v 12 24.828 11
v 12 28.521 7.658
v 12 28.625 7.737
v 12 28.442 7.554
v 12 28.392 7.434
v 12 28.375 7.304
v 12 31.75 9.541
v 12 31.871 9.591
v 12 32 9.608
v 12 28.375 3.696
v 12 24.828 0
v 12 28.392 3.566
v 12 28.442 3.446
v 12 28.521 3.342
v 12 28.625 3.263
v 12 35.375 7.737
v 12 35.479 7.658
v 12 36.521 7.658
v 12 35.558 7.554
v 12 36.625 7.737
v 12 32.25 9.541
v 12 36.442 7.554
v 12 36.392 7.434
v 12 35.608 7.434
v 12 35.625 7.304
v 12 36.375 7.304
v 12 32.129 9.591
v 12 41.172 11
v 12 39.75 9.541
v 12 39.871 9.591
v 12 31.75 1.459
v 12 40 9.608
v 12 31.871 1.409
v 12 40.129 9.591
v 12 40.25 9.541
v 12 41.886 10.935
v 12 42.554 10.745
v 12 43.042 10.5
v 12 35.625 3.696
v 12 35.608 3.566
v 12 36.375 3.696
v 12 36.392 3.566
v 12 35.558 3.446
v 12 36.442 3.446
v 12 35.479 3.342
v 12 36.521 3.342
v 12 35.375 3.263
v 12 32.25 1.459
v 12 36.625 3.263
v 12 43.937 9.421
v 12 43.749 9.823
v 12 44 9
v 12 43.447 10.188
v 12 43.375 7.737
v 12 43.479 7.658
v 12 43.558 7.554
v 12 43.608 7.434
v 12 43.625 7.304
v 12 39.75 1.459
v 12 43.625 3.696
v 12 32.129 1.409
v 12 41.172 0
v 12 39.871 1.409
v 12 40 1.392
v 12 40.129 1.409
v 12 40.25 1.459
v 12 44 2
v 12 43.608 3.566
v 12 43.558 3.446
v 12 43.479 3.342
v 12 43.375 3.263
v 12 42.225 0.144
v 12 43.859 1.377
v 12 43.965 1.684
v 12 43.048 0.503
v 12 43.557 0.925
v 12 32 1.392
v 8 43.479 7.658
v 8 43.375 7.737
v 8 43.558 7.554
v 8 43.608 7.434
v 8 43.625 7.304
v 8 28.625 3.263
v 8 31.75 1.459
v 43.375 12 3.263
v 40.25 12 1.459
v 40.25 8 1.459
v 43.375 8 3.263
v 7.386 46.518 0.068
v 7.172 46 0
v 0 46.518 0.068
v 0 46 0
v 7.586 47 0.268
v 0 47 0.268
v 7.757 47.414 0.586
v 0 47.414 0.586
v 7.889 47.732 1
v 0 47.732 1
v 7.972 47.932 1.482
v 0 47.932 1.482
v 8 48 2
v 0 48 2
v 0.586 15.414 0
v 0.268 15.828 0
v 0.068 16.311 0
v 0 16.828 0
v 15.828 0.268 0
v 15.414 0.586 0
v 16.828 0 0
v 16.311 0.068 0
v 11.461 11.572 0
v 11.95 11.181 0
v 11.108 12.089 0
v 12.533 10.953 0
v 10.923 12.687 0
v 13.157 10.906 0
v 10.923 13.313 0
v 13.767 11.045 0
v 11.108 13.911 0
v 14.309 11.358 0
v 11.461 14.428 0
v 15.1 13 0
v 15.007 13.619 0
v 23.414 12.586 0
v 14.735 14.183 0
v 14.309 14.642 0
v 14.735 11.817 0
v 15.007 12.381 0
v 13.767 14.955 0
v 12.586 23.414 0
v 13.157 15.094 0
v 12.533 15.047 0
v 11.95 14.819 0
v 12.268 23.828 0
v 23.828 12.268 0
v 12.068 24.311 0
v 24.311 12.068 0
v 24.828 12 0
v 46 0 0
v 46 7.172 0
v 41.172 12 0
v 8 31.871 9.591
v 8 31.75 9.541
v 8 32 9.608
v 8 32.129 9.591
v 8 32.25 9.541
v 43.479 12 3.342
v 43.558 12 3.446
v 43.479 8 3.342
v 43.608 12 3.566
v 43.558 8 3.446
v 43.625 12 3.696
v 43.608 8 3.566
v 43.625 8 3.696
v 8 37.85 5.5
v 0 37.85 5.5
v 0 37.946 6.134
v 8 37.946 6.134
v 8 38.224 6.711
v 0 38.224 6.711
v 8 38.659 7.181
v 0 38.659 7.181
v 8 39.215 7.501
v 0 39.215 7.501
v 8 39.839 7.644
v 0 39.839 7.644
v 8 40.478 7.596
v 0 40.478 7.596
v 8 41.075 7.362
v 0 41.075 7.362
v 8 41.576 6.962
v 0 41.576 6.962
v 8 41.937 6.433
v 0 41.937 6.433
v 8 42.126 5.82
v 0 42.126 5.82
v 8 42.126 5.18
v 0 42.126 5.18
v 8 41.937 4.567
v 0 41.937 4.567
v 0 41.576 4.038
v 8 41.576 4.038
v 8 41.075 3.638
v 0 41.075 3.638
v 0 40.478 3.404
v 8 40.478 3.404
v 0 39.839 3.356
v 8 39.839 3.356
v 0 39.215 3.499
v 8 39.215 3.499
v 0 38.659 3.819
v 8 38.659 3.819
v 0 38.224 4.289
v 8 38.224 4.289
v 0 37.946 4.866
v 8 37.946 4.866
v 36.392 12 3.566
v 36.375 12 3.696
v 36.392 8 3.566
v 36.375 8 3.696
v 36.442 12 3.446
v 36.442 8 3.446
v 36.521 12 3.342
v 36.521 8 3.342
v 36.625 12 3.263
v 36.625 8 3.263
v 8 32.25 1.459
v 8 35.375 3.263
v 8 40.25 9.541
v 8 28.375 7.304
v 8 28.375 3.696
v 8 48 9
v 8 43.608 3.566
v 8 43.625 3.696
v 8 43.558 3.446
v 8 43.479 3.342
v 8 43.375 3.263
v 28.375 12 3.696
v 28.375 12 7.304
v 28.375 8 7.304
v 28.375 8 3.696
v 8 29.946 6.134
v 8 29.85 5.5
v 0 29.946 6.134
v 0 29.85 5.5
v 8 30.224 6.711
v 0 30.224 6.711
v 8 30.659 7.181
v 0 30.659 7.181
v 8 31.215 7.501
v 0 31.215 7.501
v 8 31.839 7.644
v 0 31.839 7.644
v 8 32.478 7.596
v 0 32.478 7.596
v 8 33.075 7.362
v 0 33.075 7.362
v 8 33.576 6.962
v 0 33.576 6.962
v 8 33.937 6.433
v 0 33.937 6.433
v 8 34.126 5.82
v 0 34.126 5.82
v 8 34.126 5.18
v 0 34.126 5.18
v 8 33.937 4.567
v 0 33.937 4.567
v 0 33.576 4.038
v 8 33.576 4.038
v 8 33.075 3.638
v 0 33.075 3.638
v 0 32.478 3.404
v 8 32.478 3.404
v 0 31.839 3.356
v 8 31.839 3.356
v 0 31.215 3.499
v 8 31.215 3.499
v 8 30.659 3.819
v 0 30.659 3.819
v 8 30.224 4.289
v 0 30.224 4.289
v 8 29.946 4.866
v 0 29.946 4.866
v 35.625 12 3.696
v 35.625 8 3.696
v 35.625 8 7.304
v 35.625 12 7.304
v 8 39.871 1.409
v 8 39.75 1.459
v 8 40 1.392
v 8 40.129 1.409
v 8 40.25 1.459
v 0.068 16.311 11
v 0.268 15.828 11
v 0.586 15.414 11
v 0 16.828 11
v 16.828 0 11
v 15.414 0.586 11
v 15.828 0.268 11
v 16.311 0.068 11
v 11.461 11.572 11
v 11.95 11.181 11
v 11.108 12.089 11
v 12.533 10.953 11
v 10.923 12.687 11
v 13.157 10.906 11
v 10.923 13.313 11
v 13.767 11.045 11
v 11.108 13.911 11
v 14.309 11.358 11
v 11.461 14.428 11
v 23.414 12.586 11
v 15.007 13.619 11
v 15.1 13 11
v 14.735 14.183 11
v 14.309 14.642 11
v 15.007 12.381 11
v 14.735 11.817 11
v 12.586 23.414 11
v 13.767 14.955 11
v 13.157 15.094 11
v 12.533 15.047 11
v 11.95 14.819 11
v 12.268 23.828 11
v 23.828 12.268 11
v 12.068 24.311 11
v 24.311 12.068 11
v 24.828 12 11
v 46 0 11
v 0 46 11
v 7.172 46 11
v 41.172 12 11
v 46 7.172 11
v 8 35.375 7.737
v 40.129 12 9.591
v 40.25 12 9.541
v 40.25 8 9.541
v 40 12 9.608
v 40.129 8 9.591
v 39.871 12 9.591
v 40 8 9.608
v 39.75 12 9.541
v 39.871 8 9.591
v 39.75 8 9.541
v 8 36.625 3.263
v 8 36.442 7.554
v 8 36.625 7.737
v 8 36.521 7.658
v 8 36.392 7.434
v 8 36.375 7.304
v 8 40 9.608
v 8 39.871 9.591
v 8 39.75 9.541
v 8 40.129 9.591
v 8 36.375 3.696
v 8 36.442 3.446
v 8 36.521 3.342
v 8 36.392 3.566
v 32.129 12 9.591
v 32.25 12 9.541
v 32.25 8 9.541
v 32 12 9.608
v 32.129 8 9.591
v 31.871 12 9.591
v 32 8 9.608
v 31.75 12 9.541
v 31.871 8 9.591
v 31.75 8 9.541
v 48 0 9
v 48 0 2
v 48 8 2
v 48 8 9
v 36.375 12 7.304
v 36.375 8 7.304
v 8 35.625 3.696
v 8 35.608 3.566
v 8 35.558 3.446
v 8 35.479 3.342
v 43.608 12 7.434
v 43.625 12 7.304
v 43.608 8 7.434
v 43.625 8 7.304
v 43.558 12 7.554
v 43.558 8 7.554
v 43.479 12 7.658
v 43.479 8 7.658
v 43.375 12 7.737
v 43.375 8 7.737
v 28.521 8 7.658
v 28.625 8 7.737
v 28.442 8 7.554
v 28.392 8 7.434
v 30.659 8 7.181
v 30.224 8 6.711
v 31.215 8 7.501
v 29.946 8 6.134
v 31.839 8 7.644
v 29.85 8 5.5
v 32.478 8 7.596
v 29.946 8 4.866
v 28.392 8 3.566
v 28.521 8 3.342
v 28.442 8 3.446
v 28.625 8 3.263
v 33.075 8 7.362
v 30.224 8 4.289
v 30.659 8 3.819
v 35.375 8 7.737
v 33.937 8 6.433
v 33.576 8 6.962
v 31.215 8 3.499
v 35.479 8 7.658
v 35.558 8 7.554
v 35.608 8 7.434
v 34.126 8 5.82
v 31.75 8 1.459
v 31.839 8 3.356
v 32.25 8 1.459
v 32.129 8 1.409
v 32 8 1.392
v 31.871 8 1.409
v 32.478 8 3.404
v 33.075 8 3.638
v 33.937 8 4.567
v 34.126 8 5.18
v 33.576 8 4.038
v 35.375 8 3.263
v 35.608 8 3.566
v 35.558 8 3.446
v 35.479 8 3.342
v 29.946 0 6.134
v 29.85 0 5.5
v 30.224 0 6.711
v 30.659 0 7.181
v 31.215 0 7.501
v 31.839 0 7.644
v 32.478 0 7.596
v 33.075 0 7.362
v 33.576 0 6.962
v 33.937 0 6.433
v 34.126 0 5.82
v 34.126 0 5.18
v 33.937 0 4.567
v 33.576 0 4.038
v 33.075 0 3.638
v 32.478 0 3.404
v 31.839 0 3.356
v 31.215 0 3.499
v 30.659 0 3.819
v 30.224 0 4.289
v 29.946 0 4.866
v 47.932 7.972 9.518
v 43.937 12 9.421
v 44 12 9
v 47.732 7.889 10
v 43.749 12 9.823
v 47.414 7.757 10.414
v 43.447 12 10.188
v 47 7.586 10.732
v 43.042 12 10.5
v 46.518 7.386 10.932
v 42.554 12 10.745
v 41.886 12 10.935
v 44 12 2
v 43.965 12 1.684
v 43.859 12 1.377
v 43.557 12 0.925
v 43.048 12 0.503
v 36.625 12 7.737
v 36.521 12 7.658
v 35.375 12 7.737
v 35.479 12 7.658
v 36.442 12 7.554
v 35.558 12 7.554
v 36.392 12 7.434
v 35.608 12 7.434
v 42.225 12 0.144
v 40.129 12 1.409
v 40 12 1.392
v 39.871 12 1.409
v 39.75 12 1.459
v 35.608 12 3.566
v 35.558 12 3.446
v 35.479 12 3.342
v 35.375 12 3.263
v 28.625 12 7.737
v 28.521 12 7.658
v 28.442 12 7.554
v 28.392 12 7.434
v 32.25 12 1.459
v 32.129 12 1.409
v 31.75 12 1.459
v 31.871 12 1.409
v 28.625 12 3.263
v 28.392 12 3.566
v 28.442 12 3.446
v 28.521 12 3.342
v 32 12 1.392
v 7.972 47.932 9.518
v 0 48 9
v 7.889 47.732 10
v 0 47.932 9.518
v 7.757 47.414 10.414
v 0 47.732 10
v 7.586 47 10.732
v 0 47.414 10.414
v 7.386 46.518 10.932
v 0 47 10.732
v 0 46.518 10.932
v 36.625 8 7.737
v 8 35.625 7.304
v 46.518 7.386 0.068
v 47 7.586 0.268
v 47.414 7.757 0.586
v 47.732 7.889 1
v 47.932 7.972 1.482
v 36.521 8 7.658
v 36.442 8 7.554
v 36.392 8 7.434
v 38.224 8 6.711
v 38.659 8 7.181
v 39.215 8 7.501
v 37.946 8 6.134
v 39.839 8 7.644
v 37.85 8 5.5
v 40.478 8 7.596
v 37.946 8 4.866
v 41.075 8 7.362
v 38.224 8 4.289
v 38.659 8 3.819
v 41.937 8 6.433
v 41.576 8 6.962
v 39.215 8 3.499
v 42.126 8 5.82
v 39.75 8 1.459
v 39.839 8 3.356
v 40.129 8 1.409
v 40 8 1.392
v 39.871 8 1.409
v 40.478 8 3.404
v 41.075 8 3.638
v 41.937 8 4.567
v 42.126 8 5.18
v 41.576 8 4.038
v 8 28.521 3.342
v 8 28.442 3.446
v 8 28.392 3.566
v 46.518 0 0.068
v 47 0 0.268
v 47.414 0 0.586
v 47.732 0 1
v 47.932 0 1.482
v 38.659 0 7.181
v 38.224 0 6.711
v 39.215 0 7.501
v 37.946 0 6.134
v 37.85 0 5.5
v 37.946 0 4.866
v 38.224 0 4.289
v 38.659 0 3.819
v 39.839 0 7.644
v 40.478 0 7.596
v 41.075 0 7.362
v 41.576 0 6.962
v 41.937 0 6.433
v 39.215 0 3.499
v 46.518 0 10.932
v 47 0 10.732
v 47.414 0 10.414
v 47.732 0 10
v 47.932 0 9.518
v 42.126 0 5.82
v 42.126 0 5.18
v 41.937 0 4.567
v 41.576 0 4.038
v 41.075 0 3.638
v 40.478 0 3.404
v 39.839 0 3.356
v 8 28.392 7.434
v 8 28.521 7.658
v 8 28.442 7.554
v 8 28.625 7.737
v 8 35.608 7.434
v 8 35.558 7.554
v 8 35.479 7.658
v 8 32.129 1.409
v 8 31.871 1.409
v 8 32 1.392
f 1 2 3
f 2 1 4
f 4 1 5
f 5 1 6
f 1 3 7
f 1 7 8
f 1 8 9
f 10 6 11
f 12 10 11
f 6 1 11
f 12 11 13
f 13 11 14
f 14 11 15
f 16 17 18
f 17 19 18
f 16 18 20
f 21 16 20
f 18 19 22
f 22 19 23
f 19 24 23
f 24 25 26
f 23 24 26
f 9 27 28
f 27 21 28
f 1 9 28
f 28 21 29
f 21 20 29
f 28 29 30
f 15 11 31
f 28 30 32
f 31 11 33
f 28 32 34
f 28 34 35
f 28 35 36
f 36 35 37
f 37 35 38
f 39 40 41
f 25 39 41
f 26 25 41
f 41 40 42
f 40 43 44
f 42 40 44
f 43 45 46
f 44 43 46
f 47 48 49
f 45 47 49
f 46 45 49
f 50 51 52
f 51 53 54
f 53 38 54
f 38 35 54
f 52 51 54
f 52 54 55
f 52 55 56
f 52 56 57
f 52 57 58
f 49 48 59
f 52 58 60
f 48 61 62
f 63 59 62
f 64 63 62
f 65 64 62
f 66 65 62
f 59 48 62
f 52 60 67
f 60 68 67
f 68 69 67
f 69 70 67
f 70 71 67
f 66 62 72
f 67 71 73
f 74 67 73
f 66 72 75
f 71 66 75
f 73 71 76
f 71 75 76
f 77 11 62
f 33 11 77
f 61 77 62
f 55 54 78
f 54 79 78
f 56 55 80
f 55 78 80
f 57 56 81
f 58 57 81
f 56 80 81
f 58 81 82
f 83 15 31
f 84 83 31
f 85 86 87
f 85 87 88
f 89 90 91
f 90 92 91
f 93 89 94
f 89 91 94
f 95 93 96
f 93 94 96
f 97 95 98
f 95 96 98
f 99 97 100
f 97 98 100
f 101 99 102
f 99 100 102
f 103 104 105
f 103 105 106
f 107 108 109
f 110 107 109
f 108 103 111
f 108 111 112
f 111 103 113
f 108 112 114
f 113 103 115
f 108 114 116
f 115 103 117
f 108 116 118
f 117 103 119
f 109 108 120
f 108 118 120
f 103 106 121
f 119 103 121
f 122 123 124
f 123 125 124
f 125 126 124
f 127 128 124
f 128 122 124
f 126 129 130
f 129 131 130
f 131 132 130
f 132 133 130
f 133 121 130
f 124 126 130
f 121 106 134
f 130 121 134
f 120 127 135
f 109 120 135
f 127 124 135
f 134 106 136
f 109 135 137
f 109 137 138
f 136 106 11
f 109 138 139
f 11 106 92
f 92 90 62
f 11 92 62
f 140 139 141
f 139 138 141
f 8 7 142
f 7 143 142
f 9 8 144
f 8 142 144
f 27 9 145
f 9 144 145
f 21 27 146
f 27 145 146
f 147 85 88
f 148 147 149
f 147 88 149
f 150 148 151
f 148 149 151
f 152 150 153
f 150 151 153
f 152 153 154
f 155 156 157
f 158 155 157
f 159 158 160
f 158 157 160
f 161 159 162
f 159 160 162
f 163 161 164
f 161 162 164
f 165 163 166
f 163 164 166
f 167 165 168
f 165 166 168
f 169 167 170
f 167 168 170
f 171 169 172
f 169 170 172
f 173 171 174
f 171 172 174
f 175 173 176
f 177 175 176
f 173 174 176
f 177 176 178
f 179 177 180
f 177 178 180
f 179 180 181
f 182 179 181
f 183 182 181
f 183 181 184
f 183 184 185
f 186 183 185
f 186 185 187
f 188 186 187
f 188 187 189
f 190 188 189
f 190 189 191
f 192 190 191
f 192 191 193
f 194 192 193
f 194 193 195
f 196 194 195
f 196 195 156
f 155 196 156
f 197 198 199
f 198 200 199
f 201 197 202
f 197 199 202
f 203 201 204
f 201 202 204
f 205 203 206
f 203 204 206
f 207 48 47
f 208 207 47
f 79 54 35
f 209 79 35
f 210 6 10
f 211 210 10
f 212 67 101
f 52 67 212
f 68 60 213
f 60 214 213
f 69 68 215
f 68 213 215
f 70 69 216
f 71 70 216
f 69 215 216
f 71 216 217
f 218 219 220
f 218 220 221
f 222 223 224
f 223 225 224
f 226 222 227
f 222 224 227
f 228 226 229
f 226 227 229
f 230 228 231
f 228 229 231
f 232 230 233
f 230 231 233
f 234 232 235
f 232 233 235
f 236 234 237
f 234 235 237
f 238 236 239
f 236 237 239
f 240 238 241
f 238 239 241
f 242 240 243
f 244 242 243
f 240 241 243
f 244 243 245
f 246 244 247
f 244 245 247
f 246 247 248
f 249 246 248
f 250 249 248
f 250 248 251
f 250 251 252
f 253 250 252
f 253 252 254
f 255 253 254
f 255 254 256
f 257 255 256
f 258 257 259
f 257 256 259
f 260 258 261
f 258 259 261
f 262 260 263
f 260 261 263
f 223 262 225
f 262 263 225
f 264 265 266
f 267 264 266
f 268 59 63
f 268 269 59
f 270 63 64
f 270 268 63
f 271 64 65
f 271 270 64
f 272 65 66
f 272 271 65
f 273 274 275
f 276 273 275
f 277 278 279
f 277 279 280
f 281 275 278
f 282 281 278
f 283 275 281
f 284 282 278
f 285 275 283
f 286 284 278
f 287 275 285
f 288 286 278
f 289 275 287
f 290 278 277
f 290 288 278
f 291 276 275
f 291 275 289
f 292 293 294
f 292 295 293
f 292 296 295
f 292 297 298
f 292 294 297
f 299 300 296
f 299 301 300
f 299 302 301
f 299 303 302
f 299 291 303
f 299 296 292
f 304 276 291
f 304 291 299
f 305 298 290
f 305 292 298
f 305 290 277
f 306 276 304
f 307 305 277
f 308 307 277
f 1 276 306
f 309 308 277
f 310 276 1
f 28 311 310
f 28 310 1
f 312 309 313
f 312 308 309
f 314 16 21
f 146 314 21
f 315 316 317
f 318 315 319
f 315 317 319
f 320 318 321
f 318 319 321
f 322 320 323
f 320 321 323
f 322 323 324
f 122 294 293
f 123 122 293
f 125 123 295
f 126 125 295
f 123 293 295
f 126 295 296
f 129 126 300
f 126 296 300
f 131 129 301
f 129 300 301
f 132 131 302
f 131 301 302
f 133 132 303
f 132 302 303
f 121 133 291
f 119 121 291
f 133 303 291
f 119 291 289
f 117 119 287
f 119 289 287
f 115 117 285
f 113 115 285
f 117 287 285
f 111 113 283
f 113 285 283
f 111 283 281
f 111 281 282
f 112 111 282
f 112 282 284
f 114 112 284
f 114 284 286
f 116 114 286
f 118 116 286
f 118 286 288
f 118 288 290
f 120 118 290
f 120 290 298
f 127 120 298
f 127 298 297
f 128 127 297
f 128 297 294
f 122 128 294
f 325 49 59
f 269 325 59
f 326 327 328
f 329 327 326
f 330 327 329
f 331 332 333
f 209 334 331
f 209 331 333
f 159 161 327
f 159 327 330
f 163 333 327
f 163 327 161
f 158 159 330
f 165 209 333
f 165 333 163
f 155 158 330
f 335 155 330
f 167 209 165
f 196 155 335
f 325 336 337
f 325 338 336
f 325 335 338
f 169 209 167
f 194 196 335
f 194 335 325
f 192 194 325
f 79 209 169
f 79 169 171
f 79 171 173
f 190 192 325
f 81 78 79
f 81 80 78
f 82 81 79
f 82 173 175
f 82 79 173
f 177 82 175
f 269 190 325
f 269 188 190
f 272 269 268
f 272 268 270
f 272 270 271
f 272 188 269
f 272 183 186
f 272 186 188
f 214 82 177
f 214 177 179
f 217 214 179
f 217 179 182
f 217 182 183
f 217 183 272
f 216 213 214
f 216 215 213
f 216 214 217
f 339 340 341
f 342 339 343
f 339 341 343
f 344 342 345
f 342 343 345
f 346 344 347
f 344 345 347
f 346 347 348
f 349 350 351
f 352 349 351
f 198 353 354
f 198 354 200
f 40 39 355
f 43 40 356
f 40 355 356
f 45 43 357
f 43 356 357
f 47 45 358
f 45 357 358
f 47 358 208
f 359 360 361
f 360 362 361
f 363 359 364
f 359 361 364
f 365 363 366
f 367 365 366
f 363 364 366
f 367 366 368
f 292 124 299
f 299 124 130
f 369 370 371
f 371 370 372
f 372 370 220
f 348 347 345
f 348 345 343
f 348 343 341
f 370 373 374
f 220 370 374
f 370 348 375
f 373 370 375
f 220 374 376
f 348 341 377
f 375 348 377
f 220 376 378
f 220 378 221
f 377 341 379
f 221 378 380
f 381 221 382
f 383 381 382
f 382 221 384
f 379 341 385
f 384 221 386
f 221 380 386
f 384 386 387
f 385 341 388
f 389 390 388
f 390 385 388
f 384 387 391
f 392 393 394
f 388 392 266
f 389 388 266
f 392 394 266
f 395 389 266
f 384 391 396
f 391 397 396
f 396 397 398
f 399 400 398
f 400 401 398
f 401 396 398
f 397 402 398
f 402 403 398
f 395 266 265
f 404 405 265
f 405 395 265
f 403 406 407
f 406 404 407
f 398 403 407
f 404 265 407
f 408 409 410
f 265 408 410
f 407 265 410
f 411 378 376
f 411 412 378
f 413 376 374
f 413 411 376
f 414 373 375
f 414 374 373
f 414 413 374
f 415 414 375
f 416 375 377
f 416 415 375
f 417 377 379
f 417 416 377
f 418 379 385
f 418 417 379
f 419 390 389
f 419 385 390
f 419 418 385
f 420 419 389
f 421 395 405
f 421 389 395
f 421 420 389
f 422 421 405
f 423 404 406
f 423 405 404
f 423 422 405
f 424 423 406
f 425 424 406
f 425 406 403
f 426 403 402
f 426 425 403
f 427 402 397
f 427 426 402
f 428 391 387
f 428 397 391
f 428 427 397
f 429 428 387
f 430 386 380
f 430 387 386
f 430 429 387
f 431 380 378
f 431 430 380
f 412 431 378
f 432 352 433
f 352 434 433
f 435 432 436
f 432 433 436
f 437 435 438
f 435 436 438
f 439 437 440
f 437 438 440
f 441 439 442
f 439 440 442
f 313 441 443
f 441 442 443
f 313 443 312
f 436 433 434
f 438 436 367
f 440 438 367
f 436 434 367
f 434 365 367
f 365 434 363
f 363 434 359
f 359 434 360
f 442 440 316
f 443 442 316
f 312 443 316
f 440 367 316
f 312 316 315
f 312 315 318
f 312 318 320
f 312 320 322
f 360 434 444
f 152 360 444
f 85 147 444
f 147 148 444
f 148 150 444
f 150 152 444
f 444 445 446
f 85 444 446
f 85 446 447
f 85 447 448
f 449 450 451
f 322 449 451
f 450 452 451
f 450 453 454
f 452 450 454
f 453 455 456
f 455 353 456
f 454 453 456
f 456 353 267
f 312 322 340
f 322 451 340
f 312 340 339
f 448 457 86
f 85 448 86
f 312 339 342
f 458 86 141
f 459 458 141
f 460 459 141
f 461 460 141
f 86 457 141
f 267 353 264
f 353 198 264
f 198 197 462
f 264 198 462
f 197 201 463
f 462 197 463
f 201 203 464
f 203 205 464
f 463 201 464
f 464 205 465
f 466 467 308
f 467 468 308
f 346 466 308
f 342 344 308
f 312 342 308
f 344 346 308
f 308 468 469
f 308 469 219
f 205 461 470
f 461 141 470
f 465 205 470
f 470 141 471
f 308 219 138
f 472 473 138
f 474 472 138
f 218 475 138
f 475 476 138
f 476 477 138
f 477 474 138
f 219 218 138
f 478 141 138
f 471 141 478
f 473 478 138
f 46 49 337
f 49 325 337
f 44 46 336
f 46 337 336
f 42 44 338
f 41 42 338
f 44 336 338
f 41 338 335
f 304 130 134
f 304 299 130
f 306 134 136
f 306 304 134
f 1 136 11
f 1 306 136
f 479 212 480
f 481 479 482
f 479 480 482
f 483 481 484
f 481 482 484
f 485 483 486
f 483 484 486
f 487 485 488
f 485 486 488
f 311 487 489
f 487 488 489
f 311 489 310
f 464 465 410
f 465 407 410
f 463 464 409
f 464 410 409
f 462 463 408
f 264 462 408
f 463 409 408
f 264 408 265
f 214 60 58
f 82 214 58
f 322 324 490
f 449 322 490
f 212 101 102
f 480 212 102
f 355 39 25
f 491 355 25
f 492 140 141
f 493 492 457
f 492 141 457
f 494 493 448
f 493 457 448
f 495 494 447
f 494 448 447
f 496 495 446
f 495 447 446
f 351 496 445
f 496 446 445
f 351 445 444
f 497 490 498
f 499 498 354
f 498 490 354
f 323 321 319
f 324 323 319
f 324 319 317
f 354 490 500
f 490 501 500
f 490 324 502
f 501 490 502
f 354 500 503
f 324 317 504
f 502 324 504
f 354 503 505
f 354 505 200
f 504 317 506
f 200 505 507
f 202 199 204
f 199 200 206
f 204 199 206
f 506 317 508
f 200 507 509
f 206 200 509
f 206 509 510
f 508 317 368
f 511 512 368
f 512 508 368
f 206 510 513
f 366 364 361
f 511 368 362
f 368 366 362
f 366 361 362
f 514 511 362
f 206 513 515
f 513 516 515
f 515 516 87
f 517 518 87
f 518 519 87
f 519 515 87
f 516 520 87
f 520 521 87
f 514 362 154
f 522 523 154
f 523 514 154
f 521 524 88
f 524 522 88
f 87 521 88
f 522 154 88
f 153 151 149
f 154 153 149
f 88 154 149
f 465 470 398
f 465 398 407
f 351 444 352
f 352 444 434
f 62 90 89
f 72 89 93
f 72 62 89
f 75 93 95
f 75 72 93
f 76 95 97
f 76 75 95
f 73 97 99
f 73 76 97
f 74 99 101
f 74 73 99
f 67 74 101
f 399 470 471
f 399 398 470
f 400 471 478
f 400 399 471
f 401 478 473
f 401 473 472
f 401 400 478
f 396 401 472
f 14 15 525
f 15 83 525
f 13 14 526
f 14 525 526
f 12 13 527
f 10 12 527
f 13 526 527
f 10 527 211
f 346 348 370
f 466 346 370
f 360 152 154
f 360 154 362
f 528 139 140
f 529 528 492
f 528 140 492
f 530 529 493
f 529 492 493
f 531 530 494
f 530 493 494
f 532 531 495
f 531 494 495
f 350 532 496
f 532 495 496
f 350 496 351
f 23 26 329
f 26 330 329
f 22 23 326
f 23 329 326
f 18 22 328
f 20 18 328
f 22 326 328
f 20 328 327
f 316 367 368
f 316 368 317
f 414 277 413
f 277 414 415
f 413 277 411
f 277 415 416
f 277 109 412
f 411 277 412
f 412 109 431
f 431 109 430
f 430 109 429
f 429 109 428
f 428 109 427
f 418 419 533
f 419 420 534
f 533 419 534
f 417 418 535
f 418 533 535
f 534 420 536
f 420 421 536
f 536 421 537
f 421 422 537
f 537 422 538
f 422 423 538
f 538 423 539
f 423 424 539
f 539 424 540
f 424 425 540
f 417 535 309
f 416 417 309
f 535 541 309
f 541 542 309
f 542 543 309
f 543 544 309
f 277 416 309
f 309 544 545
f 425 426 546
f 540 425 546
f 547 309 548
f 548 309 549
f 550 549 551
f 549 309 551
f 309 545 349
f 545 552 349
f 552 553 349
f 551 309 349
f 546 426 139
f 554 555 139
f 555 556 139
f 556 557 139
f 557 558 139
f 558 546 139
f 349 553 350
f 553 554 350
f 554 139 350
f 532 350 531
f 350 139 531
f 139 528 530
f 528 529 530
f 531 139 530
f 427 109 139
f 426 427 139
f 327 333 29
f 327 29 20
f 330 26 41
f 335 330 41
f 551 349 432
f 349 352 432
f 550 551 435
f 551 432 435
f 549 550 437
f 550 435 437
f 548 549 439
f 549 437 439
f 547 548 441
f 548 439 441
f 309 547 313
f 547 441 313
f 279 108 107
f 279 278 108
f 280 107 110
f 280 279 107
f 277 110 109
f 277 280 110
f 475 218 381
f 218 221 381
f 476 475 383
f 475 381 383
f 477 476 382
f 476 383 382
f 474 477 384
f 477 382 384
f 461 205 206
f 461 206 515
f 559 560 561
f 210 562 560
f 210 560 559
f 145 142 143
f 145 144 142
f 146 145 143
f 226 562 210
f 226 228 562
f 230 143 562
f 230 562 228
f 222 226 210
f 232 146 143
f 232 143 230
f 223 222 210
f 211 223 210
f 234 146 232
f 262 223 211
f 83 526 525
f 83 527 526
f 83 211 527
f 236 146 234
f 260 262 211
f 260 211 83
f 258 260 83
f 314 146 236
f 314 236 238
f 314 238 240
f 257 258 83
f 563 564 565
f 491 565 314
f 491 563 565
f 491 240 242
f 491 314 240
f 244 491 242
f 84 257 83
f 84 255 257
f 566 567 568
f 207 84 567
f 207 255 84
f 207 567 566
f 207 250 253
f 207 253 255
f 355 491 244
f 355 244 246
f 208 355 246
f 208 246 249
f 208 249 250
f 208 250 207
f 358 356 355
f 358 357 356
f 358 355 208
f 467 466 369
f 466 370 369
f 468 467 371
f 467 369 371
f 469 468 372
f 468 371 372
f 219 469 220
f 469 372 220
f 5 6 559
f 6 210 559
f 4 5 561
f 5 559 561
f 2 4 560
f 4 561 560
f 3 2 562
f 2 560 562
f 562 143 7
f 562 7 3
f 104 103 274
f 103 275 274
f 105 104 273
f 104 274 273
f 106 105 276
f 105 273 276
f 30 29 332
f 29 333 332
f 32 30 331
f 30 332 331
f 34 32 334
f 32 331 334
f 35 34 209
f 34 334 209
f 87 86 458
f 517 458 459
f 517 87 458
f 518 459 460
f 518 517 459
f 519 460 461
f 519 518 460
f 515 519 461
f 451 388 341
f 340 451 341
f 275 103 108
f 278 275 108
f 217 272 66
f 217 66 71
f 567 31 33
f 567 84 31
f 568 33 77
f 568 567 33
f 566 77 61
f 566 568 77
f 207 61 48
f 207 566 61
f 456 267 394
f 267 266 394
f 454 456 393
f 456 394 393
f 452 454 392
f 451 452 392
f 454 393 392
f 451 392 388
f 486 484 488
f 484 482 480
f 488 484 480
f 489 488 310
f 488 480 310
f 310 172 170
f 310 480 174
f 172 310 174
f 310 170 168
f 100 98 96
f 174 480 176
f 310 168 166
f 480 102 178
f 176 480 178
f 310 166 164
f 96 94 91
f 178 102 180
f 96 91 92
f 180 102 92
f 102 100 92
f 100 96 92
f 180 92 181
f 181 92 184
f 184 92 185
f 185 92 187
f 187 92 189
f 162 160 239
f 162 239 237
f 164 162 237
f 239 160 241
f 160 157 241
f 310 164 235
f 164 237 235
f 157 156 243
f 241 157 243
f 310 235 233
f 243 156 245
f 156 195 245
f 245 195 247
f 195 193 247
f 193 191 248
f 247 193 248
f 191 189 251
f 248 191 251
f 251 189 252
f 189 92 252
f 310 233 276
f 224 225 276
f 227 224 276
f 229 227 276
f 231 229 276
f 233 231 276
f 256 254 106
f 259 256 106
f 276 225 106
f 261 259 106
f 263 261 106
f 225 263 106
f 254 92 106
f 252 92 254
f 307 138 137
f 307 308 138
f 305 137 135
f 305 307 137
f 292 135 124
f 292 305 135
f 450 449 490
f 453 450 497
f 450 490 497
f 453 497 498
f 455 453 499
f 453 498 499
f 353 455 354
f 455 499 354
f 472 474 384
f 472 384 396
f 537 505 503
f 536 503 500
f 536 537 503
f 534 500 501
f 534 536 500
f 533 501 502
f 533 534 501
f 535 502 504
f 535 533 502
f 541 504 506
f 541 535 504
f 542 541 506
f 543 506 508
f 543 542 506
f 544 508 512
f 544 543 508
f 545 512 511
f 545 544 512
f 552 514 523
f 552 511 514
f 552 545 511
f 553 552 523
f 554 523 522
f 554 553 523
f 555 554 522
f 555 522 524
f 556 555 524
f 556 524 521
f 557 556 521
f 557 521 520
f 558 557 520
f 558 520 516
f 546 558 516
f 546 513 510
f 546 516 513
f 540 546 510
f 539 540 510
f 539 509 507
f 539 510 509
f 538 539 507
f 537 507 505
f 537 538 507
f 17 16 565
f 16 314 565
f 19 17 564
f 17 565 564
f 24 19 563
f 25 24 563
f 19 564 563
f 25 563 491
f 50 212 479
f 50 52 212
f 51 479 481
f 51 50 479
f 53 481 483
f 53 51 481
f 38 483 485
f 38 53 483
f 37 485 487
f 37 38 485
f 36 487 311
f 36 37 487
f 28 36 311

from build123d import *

# Parameters (mm, degrees)
EXTRUDE_1_DEPTH     = 11
SKETCH_2_R          = 2.15
CUT_EXTRUDE_1_DEPTH = 69.767724988
CUT_EXTRUDE_2_DEPTH = 4
FILLET_1_R          = 2
CHAMFER_1_SIZE      = 4
FILLET_2_R          = 2
FILLET_3_R          = 0.5
SKETCH_4_R          = 2.1
CUT_EXTRUDE_3_DEPTH = 69.767724988


with BuildPart() as part:
    # 草图1 → 凸台-拉伸1 (new body)
    with BuildSketch(Plane.XY):
        Polygon((0, 16), (16, 0), (48, 0), (48, 12), (24, 12), (12, 24), (12, 48), (0, 48), align=None)
    extrude(amount=EXTRUDE_1_DEPTH)

    # 草图2 → 切除-拉伸1 (cut, symmetric)
    with BuildSketch(Plane.ZY):
        with Locations(Location((5.5, 40, 0), (0, 0, 270))):
            Circle(SKETCH_2_R)
        with Locations(Location((5.5, 32, 0), (0, 0, 270))):
            Circle(SKETCH_2_R)
    cut_extrude_1 = extrude(amount=CUT_EXTRUDE_1_DEPTH, both=True, mode=Mode.SUBTRACT)

    # 草图3 → 切除-拉伸2 (cut)
    with BuildSketch(Plane(origin=(12, 0, 0), x_dir=(0, 0, -1), z_dir=(1, 0, 0))):
        Polygon((-1.314210548, 40), (-3.407105274, 43.625), (-7.592894726, 43.625), (-9.685789452, 40), (-7.592894726, 36.375), (-3.407105274, 36.375), align=None)
        Polygon((-1.314210548, 32), (-3.407105274, 35.625), (-7.592894726, 35.625), (-9.685789452, 32), (-7.592894726, 28.375), (-3.407105274, 28.375), align=None)
    cut_extrude_2 = extrude(amount=-CUT_EXTRUDE_2_DEPTH, mode=Mode.SUBTRACT)

    # 镜向1: 切除-拉伸1, 切除-拉伸2 across plane
    add(cut_extrude_1.mirror(Plane(origin=(0, 0, 0), x_dir=(0, 0, 1), z_dir=(-0.7071067811865475, 0.7071067811865476, 0))), mode=Mode.SUBTRACT)
    add(cut_extrude_2.mirror(Plane(origin=(0, 0, 0), x_dir=(0, 0, 1), z_dir=(-0.7071067811865475, 0.7071067811865476, 0))), mode=Mode.SUBTRACT)

    # 圆角1
    fillet_1_edges = [part.edges().sort_by_distance(p)[0] for p in [
        (12, 24, 5.5),
        (24, 12, 5.5),
        (16, 0, 5.5),
        (0, 16, 5.5),
    ]]
    fillet(fillet_1_edges, radius=FILLET_1_R)

    # 倒角1
    chamfer_1_edges = [part.edges().sort_by_distance(p)[0] for p in [
        (12, 48, 5.5),
        (48, 12, 5.5),
    ]]
    chamfer(chamfer_1_edges, length=CHAMFER_1_SIZE)

    # 圆角2
    fillet_2_edges = [part.edges().sort_by_distance(p)[0] for p in [
        (48, 4, 0),
        (4, 48, 0),
        (10, 46, 0),
        (46, 10, 0),
        (4, 48, 11),
        (10, 46, 11),
        (46, 10, 11),
        (48, 4, 11),
    ]]
    fillet(fillet_2_edges, radius=FILLET_2_R)

    # 圆角3
    fillet_3_edges = [part.edges().sort_by_distance(p)[0] for p in [
        (28.375, 10, 3.407105274),
        (32, 10, 1.314210548),
        (35.625, 10, 3.407105274),
        (35.625, 10, 7.592894726),
        (32, 10, 9.685789452),
        (28.375, 10, 7.592894726),
        (10, 40, 1.314210548),
        (10, 36.375, 3.407105274),
        (10, 36.375, 7.592894726),
        (10, 40, 9.685789452),
        (10, 43.625, 7.592894726),
        (10, 43.625, 3.407105274),
        (10, 32, 1.314210548),
        (10, 28.375, 3.407105274),
        (10, 28.375, 7.592894726),
        (10, 32, 9.685789452),
        (10, 35.625, 7.592894726),
        (10, 35.625, 3.407105274),
        (36.375, 10, 3.407105274),
        (40, 10, 1.314210548),
        (43.625, 10, 3.407105274),
        (43.625, 10, 7.592894726),
        (40, 10, 9.685789452),
        (36.375, 10, 7.592894726),
    ]]
    fillet(fillet_3_edges, radius=FILLET_3_R)

    # 草图4 → 切除-拉伸3 (cut, through all)
    with BuildSketch(Plane.XY.offset(11)):
        with Locations((13, 13)):
            Circle(SKETCH_4_R)
    extrude(amount=-CUT_EXTRUDE_3_DEPTH, mode=Mode.SUBTRACT)


solid = part.part
